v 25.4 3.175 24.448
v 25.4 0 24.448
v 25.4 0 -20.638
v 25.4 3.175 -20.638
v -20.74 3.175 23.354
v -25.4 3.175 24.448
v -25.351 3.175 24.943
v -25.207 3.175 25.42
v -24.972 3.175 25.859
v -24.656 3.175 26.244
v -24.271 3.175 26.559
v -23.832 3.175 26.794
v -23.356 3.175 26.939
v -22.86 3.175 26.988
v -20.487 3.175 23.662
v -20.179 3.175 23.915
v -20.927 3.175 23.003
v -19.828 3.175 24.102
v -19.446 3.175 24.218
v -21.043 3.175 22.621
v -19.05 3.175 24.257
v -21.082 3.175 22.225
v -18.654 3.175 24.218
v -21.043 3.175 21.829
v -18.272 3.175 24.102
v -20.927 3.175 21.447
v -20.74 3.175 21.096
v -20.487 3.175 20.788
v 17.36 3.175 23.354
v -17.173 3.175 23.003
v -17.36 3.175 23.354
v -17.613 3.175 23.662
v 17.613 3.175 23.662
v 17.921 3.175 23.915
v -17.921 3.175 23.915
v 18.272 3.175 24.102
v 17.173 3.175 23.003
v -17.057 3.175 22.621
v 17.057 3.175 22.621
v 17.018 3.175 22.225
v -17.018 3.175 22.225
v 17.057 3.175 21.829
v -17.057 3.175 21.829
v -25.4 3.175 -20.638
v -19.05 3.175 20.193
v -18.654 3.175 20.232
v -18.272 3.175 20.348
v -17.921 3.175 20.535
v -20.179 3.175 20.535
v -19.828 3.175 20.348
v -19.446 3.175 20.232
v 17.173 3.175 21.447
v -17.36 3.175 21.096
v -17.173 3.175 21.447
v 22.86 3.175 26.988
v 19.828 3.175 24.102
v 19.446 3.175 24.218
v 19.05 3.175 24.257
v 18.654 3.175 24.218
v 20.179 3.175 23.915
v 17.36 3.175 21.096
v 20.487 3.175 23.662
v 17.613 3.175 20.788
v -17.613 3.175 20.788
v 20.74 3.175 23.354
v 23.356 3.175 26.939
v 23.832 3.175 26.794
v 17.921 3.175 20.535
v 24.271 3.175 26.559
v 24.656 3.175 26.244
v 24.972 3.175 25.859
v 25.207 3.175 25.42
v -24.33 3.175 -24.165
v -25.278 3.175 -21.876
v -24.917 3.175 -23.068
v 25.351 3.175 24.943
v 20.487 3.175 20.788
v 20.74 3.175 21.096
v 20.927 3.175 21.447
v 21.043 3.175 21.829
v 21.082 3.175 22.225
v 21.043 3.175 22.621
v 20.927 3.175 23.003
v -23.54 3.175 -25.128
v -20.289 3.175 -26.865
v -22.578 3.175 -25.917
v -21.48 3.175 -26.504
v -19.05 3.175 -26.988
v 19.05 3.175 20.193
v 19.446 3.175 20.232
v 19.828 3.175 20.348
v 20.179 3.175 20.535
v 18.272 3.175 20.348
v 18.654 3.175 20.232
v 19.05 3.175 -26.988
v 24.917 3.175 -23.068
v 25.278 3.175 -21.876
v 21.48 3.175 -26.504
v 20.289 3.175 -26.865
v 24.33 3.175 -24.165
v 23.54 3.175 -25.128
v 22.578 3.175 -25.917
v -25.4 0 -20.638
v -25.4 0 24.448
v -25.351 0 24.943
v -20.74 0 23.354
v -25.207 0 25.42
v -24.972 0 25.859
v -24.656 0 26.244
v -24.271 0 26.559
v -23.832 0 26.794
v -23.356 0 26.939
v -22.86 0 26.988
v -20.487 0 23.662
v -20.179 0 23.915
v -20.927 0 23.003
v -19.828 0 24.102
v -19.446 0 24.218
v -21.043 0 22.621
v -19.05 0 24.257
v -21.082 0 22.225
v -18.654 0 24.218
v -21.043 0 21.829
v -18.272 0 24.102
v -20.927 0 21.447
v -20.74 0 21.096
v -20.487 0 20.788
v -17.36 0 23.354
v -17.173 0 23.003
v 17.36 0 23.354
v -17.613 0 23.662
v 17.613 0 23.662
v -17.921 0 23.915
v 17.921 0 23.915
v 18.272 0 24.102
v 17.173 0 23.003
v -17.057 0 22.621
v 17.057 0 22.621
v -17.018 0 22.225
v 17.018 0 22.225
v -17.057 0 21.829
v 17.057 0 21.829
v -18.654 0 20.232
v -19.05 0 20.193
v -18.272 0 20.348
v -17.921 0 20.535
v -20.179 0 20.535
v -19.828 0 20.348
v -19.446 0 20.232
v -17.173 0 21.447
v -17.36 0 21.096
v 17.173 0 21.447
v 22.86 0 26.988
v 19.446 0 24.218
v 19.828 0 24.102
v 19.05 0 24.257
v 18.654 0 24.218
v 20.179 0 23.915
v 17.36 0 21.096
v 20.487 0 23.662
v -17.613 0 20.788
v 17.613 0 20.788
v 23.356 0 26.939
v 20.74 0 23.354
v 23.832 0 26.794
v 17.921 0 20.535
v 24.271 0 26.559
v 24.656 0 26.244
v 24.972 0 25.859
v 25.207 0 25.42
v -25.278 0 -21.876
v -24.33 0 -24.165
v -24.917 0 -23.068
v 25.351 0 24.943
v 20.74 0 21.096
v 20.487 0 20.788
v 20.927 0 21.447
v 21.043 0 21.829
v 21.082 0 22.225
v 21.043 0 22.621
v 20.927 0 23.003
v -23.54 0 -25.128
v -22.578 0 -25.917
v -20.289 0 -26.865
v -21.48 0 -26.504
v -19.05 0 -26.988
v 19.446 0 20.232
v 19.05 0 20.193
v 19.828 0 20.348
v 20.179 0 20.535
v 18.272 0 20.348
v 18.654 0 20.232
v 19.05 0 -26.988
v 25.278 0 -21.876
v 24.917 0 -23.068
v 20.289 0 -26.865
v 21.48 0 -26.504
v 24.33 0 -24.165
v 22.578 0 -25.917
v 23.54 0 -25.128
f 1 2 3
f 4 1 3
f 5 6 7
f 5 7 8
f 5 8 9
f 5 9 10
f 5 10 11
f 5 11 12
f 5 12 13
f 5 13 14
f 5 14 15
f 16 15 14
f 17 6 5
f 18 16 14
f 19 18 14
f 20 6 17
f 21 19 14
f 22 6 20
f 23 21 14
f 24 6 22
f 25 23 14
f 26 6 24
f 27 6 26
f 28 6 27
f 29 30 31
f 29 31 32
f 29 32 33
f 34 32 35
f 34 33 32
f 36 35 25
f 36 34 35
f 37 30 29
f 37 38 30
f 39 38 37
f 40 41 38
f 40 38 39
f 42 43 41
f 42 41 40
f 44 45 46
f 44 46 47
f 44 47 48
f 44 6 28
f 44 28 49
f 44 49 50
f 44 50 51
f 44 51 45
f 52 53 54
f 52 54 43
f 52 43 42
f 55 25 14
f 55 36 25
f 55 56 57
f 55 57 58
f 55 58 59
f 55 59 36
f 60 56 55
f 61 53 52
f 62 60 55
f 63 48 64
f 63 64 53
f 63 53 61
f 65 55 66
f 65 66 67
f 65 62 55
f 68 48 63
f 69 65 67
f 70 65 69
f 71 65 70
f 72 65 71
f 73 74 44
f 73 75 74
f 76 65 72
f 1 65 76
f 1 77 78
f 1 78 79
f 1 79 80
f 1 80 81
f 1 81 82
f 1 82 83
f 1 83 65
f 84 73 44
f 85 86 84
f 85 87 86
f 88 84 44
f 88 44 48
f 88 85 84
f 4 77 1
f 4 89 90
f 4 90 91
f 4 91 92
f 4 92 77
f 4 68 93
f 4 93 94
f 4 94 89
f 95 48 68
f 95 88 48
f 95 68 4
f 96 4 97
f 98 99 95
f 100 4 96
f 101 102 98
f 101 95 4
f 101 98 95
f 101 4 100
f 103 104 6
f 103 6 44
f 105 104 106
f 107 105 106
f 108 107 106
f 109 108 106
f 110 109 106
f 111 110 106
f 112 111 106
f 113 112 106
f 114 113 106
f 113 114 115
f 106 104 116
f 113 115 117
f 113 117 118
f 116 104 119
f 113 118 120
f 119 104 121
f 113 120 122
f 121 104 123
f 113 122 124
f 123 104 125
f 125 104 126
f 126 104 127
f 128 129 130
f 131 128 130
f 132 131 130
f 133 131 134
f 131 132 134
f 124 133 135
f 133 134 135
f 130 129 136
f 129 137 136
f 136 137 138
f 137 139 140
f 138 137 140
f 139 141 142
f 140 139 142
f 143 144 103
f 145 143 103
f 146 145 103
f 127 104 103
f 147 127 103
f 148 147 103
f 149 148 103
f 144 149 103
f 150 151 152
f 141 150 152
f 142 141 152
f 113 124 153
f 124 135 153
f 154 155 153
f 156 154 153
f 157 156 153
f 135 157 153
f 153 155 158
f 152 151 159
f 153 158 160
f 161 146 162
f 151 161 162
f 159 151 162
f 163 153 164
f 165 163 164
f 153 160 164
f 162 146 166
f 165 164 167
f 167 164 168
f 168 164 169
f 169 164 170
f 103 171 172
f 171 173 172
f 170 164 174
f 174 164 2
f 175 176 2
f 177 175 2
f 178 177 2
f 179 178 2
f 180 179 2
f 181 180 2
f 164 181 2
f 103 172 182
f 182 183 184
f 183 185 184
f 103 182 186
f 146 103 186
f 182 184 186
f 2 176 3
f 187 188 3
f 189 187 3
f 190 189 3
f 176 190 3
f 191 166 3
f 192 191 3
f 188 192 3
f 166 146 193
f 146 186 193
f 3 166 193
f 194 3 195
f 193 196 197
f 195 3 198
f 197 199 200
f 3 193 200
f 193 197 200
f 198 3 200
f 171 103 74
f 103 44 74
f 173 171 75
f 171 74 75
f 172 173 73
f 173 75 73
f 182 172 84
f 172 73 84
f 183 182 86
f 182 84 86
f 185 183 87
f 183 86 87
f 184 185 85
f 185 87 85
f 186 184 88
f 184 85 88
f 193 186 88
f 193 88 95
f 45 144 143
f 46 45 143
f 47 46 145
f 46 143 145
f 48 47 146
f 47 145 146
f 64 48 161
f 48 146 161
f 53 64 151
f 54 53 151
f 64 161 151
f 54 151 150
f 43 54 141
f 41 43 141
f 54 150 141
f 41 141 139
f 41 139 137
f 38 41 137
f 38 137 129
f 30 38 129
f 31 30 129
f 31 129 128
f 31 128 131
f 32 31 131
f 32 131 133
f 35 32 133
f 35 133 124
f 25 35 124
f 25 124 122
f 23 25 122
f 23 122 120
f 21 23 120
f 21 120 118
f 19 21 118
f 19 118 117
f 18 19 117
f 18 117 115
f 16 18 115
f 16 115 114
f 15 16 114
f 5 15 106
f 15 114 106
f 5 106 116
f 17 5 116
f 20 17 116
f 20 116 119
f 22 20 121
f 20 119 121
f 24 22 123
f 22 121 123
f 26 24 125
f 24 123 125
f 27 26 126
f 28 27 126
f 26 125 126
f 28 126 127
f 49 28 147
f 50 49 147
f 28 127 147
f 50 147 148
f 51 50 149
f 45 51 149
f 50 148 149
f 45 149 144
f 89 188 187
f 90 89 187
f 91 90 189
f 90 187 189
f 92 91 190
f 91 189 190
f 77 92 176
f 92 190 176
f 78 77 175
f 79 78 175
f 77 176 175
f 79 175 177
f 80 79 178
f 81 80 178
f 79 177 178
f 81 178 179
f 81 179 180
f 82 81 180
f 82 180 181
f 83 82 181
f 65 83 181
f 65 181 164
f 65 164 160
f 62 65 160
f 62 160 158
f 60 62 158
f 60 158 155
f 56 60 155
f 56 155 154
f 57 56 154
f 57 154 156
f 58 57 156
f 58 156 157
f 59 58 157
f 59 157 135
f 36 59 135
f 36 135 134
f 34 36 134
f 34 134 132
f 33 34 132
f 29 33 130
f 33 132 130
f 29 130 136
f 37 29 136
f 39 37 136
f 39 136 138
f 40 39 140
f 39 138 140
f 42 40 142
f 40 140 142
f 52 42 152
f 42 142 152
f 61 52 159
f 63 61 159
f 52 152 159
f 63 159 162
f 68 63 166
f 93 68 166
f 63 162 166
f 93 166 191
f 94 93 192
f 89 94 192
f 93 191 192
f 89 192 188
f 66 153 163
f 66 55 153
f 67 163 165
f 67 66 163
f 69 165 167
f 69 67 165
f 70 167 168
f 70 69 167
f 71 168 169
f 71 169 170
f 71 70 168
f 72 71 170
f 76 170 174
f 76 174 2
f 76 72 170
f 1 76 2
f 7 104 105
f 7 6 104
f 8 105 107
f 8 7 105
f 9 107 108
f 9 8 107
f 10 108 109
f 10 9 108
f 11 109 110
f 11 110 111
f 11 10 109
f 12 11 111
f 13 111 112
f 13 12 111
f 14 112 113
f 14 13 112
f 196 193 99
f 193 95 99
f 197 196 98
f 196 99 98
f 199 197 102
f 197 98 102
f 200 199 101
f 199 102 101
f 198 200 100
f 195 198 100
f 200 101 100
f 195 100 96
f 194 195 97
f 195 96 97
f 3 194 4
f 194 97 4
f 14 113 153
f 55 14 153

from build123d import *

# Parameters (mm, degrees)
SKETCH1_W           = 50.8
SKETCH1_H           = 53.975
BOSS_EXTRUDE1_DEPTH = 3.175
SKETCH2_R           = 2.032
CUT_EXTRUDE1_DEPTH  = 38.196314082
FILLET1_R           = 2.54
FILLET2_R           = 6.35


with BuildPart() as part:
    # Sketch1 → Boss-Extrude1 (new body)
    with BuildSketch(Plane(origin=(0, 0, 0), x_dir=(1, 0, 0), z_dir=(0, 1, 0))):
        Rectangle(SKETCH1_W, SKETCH1_H)
    extrude(amount=BOSS_EXTRUDE1_DEPTH)

    # Sketch2 → Cut-Extrude1 (cut, through all)
    with BuildSketch(Plane(origin=(0, 0, 0), x_dir=(-1, 0, 0), z_dir=(0, -1, 0))):
        with Locations(Location((-19.05, -22.225, 0), (0, 0, 90))):
            Circle(SKETCH2_R)
        with Locations(Location((19.05, -22.225, 0), (0, 0, 90))):
            Circle(SKETCH2_R)
    extrude(amount=-CUT_EXTRUDE1_DEPTH, mode=Mode.SUBTRACT)

    # Fillet1
    fillet1_edges = [part.edges().sort_by_distance(p)[0] for p in [
        (25.4, 1.5875, 26.9875),
        (-25.4, 1.5875, 26.9875),
    ]]
    fillet(fillet1_edges, radius=FILLET1_R)

    # Fillet2
    fillet2_edges = [part.edges().sort_by_distance(p)[0] for p in [
        (-25.4, 1.5875, -26.9875),
        (25.4, 1.5875, -26.9875),
    ]]
    fillet(fillet2_edges, radius=FILLET2_R)


solid = part.part
